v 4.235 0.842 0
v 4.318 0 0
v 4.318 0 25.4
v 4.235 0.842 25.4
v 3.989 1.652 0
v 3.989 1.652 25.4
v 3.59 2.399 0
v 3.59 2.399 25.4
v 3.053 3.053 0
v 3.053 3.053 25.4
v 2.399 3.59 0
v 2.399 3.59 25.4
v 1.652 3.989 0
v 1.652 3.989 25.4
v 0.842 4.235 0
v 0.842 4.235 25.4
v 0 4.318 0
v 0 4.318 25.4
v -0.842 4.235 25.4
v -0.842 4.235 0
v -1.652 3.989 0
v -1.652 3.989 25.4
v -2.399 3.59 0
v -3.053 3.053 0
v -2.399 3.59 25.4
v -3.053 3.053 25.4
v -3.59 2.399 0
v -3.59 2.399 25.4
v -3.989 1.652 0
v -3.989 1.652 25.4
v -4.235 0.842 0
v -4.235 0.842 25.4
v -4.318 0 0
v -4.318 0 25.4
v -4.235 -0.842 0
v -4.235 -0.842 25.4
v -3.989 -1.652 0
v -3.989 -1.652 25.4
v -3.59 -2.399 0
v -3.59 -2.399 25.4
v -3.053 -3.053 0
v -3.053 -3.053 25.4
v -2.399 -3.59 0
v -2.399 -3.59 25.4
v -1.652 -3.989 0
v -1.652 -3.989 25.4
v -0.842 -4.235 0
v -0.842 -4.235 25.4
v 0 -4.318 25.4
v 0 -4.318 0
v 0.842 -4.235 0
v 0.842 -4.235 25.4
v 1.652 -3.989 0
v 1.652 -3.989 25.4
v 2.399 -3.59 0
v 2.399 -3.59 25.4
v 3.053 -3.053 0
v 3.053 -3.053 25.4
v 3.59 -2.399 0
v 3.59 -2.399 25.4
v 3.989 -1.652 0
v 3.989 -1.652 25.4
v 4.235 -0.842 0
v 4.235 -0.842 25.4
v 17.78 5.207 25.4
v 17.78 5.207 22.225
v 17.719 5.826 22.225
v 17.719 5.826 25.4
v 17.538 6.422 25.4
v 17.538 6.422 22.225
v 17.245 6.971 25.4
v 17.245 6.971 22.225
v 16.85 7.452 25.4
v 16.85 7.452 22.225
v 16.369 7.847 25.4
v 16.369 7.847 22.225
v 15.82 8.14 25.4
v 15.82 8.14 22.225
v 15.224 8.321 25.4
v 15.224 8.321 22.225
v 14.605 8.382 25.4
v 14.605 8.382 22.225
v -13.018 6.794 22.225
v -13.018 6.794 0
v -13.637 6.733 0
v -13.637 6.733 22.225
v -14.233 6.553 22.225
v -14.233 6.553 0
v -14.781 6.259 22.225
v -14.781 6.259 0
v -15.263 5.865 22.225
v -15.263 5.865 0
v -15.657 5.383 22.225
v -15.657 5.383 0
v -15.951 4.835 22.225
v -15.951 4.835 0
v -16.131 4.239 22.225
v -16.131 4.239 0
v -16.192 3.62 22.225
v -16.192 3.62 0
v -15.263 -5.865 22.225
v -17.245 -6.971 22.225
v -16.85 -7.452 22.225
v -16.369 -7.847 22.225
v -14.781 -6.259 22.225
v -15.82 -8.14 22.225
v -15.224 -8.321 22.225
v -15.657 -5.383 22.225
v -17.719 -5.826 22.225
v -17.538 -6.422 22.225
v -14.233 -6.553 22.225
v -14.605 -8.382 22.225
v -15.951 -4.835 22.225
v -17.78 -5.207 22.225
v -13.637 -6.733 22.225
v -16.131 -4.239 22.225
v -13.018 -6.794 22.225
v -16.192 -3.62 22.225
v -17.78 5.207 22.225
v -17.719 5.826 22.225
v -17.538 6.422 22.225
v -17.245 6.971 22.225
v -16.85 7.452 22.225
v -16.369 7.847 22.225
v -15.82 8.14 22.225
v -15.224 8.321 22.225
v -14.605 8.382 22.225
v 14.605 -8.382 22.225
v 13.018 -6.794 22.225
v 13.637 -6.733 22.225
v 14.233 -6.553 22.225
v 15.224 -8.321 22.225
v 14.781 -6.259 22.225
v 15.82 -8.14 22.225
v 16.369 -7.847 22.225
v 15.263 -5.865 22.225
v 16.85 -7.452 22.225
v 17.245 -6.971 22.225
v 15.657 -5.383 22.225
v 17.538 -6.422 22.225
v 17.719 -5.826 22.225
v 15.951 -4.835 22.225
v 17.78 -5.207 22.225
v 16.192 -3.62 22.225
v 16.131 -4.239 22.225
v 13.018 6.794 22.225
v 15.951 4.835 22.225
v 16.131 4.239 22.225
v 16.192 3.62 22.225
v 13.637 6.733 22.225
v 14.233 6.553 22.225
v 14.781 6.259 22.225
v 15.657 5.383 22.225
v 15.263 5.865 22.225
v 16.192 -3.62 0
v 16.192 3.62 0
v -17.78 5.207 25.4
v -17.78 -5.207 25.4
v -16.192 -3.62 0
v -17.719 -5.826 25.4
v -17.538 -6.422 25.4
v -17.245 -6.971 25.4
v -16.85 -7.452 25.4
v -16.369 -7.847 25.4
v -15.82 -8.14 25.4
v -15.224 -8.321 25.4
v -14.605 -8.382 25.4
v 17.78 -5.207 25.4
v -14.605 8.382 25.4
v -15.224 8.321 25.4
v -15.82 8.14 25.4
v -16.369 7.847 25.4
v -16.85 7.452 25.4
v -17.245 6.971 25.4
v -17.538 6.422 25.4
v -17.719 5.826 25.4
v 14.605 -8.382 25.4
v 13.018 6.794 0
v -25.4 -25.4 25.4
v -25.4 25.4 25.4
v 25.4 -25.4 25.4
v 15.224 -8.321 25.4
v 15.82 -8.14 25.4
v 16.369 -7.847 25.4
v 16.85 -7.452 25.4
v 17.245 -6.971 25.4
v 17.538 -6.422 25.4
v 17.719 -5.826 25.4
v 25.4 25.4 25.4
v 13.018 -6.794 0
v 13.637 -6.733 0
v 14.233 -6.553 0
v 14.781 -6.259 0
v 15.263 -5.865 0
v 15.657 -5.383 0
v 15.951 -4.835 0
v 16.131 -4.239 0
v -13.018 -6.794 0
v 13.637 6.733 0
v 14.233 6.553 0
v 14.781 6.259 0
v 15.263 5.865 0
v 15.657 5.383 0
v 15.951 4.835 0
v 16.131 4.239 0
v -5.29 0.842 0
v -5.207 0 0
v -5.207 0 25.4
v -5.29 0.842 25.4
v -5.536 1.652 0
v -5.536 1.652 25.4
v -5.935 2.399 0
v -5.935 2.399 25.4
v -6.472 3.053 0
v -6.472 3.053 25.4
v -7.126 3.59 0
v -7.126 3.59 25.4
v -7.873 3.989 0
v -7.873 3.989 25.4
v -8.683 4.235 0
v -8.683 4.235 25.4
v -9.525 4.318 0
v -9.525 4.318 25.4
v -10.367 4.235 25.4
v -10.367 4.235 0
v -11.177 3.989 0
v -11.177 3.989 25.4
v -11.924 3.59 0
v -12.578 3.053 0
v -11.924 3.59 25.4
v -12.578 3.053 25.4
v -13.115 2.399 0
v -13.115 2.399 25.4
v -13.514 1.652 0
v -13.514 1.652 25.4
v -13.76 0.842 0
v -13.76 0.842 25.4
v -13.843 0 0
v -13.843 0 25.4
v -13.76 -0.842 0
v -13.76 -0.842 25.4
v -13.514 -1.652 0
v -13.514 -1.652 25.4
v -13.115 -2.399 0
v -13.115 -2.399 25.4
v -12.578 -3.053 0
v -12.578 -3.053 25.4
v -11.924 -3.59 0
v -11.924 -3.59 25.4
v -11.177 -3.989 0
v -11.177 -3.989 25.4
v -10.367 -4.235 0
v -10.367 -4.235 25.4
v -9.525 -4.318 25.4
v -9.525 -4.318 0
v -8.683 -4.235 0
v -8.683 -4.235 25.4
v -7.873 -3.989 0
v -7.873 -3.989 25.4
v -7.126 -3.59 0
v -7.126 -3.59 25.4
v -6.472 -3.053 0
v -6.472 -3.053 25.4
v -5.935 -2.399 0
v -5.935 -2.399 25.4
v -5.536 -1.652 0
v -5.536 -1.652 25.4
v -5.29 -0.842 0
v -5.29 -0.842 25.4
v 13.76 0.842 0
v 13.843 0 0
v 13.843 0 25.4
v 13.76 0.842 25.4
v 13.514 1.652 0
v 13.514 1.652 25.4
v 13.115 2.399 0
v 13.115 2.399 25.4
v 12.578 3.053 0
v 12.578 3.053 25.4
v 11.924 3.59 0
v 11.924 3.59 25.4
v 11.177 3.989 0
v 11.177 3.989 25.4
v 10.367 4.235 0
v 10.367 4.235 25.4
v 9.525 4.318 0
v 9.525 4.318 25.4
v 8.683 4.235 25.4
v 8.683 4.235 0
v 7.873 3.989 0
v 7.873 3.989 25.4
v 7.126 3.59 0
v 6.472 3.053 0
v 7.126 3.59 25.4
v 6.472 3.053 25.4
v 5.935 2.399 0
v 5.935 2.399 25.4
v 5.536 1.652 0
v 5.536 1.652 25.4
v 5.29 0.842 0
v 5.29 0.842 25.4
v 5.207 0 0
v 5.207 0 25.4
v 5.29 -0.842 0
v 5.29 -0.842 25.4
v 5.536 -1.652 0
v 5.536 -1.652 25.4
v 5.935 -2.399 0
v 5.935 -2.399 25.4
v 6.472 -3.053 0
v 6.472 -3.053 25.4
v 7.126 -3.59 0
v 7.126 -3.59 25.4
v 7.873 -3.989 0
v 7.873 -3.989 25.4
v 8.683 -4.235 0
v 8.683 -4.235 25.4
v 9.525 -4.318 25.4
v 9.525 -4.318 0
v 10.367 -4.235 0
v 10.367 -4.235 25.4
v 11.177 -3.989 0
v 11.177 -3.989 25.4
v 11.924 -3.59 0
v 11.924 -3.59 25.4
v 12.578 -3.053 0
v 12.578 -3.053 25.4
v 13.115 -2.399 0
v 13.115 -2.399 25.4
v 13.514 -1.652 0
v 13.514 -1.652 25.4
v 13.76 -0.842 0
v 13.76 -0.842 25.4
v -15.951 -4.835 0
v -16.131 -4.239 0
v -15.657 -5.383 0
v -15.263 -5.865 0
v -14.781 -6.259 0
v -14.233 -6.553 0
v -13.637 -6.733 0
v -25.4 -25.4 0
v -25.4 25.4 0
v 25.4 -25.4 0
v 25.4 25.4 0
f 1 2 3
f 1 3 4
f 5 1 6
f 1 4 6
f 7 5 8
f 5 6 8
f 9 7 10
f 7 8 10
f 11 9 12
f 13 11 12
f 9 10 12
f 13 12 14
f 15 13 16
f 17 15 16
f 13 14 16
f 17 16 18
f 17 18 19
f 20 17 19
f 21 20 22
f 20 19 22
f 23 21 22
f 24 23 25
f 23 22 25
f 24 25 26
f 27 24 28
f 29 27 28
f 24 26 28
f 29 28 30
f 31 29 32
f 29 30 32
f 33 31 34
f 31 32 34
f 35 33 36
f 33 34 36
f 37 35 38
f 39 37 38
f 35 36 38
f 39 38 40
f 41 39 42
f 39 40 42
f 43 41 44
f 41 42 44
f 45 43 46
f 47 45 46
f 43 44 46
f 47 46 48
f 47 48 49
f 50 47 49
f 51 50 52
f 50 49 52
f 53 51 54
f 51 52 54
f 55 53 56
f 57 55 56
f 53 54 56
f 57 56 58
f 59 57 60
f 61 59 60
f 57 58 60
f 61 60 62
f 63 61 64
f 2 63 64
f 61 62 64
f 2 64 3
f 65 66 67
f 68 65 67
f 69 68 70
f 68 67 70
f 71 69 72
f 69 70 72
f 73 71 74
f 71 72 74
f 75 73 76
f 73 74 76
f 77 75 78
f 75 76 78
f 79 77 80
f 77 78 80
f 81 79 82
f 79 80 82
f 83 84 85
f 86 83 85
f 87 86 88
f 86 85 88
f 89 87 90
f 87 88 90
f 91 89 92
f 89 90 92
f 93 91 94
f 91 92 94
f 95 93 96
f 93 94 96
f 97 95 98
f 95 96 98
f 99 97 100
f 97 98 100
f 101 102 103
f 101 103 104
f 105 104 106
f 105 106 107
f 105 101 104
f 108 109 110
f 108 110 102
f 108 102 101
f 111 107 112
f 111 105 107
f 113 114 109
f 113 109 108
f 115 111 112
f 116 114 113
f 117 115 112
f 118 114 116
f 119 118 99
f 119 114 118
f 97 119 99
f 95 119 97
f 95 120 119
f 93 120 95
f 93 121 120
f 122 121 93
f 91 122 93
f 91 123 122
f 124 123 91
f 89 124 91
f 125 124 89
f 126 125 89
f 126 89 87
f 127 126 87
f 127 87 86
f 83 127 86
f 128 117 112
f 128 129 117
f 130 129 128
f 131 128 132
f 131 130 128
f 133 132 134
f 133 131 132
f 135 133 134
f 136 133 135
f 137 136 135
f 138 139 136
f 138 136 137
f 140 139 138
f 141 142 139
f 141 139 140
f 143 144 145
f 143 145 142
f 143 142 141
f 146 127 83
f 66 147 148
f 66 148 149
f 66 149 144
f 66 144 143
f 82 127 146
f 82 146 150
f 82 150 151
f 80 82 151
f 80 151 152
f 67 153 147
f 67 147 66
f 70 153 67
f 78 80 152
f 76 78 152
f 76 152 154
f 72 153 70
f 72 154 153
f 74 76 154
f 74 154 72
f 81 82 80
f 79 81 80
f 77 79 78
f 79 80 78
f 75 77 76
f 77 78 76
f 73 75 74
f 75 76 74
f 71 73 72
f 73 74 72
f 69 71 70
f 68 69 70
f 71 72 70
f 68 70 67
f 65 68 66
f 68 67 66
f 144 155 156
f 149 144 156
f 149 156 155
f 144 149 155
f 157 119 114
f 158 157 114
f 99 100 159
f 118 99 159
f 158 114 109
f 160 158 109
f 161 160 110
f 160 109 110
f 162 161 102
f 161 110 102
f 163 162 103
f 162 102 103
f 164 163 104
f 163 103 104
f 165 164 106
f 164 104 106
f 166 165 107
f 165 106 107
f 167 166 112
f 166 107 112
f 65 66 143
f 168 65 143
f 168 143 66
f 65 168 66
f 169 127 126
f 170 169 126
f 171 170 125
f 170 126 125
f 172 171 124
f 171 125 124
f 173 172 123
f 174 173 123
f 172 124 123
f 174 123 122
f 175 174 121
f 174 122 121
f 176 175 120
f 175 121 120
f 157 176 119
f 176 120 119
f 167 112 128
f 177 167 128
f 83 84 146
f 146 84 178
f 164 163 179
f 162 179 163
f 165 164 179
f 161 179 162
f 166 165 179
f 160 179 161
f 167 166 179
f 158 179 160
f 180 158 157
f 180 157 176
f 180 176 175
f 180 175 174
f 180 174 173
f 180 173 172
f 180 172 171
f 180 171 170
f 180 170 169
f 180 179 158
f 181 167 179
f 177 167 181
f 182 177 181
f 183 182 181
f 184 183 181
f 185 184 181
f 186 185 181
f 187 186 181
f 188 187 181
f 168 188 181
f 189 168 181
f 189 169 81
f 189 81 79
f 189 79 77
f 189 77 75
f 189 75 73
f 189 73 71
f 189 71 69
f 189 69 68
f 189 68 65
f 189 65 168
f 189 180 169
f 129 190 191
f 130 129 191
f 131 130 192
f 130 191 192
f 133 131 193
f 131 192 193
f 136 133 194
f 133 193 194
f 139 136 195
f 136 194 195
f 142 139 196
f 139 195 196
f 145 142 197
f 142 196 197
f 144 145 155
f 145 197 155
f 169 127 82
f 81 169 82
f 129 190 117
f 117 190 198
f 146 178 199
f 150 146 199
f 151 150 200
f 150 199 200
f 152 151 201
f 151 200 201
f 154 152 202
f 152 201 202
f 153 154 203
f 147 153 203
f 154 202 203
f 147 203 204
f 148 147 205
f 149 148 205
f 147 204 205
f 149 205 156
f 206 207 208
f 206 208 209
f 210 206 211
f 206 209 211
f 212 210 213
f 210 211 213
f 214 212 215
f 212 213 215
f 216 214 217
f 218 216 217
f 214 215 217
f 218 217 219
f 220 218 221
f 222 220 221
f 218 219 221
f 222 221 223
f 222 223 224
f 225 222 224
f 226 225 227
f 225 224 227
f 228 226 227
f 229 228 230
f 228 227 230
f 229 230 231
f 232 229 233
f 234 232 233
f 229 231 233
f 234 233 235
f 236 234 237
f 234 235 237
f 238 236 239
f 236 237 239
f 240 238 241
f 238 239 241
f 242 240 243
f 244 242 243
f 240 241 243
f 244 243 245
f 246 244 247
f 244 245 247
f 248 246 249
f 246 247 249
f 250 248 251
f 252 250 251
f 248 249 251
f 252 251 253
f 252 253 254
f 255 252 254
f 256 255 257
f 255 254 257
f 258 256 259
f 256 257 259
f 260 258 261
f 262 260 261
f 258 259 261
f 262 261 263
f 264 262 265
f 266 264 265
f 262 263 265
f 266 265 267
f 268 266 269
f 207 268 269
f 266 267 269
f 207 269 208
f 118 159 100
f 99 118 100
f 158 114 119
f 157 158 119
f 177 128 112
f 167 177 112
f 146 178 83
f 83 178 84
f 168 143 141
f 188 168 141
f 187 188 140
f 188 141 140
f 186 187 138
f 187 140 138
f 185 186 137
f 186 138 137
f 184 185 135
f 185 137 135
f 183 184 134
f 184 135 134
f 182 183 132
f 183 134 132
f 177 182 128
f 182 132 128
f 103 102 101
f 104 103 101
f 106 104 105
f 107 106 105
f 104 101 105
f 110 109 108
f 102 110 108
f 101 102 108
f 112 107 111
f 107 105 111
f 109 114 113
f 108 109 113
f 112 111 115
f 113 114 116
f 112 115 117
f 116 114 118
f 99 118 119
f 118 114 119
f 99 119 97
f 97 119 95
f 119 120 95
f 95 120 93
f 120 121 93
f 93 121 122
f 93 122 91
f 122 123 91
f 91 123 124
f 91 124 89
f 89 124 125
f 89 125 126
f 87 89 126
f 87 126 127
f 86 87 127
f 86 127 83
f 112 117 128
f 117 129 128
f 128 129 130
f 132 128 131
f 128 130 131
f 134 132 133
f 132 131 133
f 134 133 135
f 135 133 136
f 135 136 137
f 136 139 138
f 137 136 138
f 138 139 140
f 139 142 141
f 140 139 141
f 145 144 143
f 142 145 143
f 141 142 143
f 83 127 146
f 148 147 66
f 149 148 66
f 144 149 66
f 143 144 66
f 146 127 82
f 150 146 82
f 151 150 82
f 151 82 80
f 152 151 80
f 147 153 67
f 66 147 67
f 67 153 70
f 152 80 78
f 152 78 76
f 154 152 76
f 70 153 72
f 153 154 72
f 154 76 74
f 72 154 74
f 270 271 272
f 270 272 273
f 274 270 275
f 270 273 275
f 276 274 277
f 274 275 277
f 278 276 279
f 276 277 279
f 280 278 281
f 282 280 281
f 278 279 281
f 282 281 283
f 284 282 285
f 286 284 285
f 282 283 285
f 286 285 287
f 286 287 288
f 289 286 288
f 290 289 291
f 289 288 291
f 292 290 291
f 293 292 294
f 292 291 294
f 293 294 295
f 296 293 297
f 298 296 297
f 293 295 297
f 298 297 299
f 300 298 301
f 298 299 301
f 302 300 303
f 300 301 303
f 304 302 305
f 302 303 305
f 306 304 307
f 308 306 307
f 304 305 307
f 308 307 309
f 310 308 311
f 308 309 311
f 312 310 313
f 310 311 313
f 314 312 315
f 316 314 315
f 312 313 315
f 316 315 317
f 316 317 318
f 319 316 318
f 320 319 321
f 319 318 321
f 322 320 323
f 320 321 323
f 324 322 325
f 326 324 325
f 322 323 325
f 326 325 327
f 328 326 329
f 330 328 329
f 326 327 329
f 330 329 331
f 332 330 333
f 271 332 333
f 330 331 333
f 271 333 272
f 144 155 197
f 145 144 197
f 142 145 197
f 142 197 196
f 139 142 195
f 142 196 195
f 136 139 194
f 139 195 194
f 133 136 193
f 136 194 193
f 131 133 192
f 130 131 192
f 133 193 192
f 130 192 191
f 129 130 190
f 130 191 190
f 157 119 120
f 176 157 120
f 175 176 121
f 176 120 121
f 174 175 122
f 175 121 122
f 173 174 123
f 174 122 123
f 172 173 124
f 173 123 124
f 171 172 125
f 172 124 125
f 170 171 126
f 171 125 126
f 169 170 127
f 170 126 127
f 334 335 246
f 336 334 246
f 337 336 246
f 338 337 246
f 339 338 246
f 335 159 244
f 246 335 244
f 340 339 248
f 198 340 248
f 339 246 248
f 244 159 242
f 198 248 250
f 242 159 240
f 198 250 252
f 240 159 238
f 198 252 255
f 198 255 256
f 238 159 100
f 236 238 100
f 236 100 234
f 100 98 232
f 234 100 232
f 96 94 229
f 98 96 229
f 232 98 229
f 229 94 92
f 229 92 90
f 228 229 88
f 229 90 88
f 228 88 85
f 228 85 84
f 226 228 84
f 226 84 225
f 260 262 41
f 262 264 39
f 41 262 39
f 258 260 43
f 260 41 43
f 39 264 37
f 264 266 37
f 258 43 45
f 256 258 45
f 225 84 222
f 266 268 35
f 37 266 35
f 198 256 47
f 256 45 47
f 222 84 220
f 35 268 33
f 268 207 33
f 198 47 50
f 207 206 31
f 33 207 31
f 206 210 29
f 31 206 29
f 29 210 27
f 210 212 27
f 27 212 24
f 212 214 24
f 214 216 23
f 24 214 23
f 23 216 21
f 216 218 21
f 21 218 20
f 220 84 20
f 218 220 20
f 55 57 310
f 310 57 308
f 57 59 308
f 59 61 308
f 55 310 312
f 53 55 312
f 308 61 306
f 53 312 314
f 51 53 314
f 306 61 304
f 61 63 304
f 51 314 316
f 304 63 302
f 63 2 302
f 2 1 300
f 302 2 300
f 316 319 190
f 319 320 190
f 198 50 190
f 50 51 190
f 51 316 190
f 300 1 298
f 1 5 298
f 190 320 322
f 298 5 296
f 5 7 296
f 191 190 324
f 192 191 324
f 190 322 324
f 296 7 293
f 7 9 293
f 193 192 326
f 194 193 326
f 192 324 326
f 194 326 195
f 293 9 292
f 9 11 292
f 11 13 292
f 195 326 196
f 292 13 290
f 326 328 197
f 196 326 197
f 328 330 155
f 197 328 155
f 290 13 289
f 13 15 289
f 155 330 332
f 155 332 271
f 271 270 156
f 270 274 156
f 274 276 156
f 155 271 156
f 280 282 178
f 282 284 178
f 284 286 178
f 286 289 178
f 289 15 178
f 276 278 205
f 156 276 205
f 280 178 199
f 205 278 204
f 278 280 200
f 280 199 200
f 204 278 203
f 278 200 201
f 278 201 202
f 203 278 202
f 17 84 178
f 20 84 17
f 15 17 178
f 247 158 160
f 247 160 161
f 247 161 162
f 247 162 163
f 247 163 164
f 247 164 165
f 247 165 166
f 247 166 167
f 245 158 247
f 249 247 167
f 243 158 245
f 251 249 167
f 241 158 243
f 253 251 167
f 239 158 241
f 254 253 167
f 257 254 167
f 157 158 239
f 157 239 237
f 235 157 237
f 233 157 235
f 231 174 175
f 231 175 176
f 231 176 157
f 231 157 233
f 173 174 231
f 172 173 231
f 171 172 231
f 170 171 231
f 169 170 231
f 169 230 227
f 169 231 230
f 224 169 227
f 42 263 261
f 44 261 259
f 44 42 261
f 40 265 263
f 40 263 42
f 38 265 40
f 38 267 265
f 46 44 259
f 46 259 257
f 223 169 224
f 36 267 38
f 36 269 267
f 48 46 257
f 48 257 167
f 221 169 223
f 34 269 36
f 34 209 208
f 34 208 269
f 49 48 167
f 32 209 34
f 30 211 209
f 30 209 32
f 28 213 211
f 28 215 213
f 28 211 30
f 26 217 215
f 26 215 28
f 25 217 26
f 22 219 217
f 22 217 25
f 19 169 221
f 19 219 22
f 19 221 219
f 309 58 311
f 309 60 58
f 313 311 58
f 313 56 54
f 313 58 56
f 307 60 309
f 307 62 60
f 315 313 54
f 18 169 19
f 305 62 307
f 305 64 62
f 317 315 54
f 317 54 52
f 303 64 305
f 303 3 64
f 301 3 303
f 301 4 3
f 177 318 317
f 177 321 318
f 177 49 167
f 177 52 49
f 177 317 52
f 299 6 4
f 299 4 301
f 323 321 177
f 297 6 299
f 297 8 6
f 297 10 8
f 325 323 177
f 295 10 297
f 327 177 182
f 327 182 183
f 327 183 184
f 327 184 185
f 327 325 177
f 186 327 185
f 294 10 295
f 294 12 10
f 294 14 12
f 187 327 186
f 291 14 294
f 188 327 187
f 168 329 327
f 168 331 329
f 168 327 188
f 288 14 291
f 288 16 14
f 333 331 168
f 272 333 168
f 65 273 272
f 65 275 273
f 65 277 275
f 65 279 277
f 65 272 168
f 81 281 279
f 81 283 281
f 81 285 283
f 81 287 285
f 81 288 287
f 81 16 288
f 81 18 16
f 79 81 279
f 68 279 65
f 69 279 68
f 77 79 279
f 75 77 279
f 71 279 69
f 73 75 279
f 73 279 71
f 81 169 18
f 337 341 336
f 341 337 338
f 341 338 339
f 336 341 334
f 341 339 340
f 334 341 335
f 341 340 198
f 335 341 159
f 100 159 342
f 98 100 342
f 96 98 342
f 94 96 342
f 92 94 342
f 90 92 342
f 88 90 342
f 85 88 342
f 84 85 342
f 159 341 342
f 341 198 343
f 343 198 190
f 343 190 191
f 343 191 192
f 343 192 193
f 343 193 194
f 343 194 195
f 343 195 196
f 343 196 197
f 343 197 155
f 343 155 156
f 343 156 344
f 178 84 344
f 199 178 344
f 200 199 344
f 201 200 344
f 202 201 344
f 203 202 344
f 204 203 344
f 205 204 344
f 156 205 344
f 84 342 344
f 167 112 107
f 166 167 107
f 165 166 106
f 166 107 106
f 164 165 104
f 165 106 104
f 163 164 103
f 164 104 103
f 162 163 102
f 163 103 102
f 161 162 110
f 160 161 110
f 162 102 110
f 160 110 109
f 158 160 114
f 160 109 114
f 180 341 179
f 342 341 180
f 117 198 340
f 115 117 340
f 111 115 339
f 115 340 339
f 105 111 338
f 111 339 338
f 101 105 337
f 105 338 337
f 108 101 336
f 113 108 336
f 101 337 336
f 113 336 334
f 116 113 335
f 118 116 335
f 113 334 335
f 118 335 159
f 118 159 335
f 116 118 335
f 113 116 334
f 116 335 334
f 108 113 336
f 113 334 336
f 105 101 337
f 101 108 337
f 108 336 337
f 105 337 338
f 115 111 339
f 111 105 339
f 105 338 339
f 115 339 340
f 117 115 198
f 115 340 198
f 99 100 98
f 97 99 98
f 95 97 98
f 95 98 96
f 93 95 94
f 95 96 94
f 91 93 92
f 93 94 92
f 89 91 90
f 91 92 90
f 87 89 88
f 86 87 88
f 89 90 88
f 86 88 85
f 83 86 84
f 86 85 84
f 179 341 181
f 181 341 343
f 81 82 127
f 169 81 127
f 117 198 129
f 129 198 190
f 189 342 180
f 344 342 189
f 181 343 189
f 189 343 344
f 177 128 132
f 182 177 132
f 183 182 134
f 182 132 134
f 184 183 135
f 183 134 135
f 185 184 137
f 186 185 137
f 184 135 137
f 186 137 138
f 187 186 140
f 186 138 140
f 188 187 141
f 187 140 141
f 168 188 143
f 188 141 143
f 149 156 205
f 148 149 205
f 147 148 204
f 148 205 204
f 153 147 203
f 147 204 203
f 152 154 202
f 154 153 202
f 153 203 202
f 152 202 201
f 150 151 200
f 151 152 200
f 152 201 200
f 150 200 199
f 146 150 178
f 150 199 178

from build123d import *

# Parameters (mm, degrees)
F0_W     = 50.8
F0_H     = 50.8
F1_DEPTH = 25.4
F2_DEPTH = 22.225
F3_DEPTH = 25.4
F4_DEPTH = 3.175
F6_R     = 4.318
F7_DEPTH = 25.4


with BuildPart() as f1:
    # F0 (on Top) → F1 (new body)
    with BuildSketch(Plane.XY):
        Rectangle(F0_W, F0_H)
        with BuildLine():
            Line((14.605, -8.382), (-14.605, -8.382))
            ThreePointArc((-14.605, -8.382), (-16.850064, -7.452064), (-17.78, -5.207))
            Line((-17.78, -5.207), (-17.78, 5.207))
            ThreePointArc((-17.78, 5.207), (-16.850064, 7.452064), (-14.605, 8.382))
            Line((-14.605, 8.382), (14.605, 8.382))
            ThreePointArc((14.605, 8.382), (16.850064, 7.452064), (17.78, 5.207))
            Line((17.78, 5.207), (17.78, -5.207))
            ThreePointArc((17.78, -5.207), (16.850064, -7.452064), (14.605, -8.382))
        make_face(mode=Mode.SUBTRACT)
    extrude(amount=F1_DEPTH)

    # F0 (on Top) → F2 (join)
    with BuildSketch(Plane.XY):
        with BuildLine():
            ThreePointArc((-17.78, -5.207), (-16.850064, -7.452064), (-14.605, -8.382))
            Line((-14.605, -8.382), (14.605, -8.382))
            ThreePointArc((14.605, -8.382), (16.850064, -7.452064), (17.78, -5.207))
            Line((17.78, -5.207), (17.78, 5.207))
            ThreePointArc((17.78, 5.207), (16.850064, 7.452064), (14.605, 8.382))
            Line((14.605, 8.382), (-14.605, 8.382))
            ThreePointArc((-14.605, 8.382), (-16.850064, 7.452064), (-17.78, 5.207))
            Line((-17.78, 5.207), (-17.78, -5.207))
        make_face()
        with BuildLine():
            Line((13.0175, -6.7945), (-13.0175, -6.7945))
            ThreePointArc((-13.0175, -6.7945), (-15.262564, -5.864564), (-16.1925, -3.6195))
            Line((-16.1925, -3.6195), (-16.1925, 3.6195))
            ThreePointArc((-16.1925, 3.6195), (-15.262564, 5.864564), (-13.0175, 6.7945))
            Line((-13.0175, 6.7945), (13.0175, 6.7945))
            ThreePointArc((13.0175, 6.7945), (15.262564, 5.864564), (16.1925, 3.6195))
            Line((16.1925, 3.6195), (16.1925, -3.6195))
            ThreePointArc((16.1925, -3.6195), (15.262564, -5.864564), (13.0175, -6.7945))
        make_face(mode=Mode.SUBTRACT)
    extrude(amount=F2_DEPTH)


with BuildPart() as f3:
    # F0 (on Top) → F3 (new body)
    with BuildSketch(Plane.XY):
        with BuildLine():
            ThreePointArc((-16.1925, -3.6195), (-15.262564, -5.864564), (-13.0175, -6.7945))
            Line((-13.0175, -6.7945), (13.0175, -6.7945))
            ThreePointArc((13.0175, -6.7945), (15.262564, -5.864564), (16.1925, -3.6195))
            Line((16.1925, -3.6195), (16.1925, 3.6195))
            ThreePointArc((16.1925, 3.6195), (15.262564, 5.864564), (13.0175, 6.7945))
            Line((13.0175, 6.7945), (-13.0175, 6.7945))
            ThreePointArc((-13.0175, 6.7945), (-15.262564, 5.864564), (-16.1925, 3.6195))
            Line((-16.1925, 3.6195), (-16.1925, -3.6195))
        make_face()
    extrude(amount=F3_DEPTH)


with BuildPart() as f4:
    # F2_face (on face) → F4 (new body)
    with BuildSketch(Plane.XY.offset(22.225)):
        with BuildLine():
            ThreePointArc((-17.78, -5.207), (-16.850064, -7.452064), (-14.605, -8.382))
            Line((-14.605, -8.382), (14.605, -8.382))
            ThreePointArc((14.605, -8.382), (16.850064, -7.452064), (17.78, -5.207))
            Line((17.78, -5.207), (17.78, 5.207))
            ThreePointArc((17.78, 5.207), (16.850064, 7.452064), (14.605, 8.382))
            Line((14.605, 8.382), (-14.605, 8.382))
            ThreePointArc((-14.605, 8.382), (-16.850064, 7.452064), (-17.78, 5.207))
            Line((-17.78, 5.207), (-17.78, -5.207))
        make_face()
        with BuildLine():
            Line((13.0175, -6.7945), (-13.0175, -6.7945))
            ThreePointArc((-13.0175, -6.7945), (-15.262564, -5.864564), (-16.1925, -3.6195))
            Line((-16.1925, -3.6195), (-16.1925, 3.6195))
            ThreePointArc((-16.1925, 3.6195), (-15.262564, 5.864564), (-13.0175, 6.7945))
            Line((-13.0175, 6.7945), (13.0175, 6.7945))
            ThreePointArc((13.0175, 6.7945), (15.262564, 5.864564), (16.1925, 3.6195))
            Line((16.1925, 3.6195), (16.1925, -3.6195))
            ThreePointArc((16.1925, -3.6195), (15.262564, -5.864564), (13.0175, -6.7945))
        make_face(mode=Mode.SUBTRACT)
    extrude(amount=F4_DEPTH)


with BuildPart() as f3_1:
    add(f3.part)

    # F5: union F4
    add(f4.part)

    # F6 (on face) → F7 (cut)
    with BuildSketch(Plane.XY.offset(25.4)):
        Circle(F6_R)
        with Locations((-9.525, 0)):
            Circle(F6_R)
        with Locations((9.525, 0)):
            Circle(F6_R)
    extrude(amount=-F7_DEPTH, mode=Mode.SUBTRACT)


solid = Compound([f1.part, f3_1.part])
